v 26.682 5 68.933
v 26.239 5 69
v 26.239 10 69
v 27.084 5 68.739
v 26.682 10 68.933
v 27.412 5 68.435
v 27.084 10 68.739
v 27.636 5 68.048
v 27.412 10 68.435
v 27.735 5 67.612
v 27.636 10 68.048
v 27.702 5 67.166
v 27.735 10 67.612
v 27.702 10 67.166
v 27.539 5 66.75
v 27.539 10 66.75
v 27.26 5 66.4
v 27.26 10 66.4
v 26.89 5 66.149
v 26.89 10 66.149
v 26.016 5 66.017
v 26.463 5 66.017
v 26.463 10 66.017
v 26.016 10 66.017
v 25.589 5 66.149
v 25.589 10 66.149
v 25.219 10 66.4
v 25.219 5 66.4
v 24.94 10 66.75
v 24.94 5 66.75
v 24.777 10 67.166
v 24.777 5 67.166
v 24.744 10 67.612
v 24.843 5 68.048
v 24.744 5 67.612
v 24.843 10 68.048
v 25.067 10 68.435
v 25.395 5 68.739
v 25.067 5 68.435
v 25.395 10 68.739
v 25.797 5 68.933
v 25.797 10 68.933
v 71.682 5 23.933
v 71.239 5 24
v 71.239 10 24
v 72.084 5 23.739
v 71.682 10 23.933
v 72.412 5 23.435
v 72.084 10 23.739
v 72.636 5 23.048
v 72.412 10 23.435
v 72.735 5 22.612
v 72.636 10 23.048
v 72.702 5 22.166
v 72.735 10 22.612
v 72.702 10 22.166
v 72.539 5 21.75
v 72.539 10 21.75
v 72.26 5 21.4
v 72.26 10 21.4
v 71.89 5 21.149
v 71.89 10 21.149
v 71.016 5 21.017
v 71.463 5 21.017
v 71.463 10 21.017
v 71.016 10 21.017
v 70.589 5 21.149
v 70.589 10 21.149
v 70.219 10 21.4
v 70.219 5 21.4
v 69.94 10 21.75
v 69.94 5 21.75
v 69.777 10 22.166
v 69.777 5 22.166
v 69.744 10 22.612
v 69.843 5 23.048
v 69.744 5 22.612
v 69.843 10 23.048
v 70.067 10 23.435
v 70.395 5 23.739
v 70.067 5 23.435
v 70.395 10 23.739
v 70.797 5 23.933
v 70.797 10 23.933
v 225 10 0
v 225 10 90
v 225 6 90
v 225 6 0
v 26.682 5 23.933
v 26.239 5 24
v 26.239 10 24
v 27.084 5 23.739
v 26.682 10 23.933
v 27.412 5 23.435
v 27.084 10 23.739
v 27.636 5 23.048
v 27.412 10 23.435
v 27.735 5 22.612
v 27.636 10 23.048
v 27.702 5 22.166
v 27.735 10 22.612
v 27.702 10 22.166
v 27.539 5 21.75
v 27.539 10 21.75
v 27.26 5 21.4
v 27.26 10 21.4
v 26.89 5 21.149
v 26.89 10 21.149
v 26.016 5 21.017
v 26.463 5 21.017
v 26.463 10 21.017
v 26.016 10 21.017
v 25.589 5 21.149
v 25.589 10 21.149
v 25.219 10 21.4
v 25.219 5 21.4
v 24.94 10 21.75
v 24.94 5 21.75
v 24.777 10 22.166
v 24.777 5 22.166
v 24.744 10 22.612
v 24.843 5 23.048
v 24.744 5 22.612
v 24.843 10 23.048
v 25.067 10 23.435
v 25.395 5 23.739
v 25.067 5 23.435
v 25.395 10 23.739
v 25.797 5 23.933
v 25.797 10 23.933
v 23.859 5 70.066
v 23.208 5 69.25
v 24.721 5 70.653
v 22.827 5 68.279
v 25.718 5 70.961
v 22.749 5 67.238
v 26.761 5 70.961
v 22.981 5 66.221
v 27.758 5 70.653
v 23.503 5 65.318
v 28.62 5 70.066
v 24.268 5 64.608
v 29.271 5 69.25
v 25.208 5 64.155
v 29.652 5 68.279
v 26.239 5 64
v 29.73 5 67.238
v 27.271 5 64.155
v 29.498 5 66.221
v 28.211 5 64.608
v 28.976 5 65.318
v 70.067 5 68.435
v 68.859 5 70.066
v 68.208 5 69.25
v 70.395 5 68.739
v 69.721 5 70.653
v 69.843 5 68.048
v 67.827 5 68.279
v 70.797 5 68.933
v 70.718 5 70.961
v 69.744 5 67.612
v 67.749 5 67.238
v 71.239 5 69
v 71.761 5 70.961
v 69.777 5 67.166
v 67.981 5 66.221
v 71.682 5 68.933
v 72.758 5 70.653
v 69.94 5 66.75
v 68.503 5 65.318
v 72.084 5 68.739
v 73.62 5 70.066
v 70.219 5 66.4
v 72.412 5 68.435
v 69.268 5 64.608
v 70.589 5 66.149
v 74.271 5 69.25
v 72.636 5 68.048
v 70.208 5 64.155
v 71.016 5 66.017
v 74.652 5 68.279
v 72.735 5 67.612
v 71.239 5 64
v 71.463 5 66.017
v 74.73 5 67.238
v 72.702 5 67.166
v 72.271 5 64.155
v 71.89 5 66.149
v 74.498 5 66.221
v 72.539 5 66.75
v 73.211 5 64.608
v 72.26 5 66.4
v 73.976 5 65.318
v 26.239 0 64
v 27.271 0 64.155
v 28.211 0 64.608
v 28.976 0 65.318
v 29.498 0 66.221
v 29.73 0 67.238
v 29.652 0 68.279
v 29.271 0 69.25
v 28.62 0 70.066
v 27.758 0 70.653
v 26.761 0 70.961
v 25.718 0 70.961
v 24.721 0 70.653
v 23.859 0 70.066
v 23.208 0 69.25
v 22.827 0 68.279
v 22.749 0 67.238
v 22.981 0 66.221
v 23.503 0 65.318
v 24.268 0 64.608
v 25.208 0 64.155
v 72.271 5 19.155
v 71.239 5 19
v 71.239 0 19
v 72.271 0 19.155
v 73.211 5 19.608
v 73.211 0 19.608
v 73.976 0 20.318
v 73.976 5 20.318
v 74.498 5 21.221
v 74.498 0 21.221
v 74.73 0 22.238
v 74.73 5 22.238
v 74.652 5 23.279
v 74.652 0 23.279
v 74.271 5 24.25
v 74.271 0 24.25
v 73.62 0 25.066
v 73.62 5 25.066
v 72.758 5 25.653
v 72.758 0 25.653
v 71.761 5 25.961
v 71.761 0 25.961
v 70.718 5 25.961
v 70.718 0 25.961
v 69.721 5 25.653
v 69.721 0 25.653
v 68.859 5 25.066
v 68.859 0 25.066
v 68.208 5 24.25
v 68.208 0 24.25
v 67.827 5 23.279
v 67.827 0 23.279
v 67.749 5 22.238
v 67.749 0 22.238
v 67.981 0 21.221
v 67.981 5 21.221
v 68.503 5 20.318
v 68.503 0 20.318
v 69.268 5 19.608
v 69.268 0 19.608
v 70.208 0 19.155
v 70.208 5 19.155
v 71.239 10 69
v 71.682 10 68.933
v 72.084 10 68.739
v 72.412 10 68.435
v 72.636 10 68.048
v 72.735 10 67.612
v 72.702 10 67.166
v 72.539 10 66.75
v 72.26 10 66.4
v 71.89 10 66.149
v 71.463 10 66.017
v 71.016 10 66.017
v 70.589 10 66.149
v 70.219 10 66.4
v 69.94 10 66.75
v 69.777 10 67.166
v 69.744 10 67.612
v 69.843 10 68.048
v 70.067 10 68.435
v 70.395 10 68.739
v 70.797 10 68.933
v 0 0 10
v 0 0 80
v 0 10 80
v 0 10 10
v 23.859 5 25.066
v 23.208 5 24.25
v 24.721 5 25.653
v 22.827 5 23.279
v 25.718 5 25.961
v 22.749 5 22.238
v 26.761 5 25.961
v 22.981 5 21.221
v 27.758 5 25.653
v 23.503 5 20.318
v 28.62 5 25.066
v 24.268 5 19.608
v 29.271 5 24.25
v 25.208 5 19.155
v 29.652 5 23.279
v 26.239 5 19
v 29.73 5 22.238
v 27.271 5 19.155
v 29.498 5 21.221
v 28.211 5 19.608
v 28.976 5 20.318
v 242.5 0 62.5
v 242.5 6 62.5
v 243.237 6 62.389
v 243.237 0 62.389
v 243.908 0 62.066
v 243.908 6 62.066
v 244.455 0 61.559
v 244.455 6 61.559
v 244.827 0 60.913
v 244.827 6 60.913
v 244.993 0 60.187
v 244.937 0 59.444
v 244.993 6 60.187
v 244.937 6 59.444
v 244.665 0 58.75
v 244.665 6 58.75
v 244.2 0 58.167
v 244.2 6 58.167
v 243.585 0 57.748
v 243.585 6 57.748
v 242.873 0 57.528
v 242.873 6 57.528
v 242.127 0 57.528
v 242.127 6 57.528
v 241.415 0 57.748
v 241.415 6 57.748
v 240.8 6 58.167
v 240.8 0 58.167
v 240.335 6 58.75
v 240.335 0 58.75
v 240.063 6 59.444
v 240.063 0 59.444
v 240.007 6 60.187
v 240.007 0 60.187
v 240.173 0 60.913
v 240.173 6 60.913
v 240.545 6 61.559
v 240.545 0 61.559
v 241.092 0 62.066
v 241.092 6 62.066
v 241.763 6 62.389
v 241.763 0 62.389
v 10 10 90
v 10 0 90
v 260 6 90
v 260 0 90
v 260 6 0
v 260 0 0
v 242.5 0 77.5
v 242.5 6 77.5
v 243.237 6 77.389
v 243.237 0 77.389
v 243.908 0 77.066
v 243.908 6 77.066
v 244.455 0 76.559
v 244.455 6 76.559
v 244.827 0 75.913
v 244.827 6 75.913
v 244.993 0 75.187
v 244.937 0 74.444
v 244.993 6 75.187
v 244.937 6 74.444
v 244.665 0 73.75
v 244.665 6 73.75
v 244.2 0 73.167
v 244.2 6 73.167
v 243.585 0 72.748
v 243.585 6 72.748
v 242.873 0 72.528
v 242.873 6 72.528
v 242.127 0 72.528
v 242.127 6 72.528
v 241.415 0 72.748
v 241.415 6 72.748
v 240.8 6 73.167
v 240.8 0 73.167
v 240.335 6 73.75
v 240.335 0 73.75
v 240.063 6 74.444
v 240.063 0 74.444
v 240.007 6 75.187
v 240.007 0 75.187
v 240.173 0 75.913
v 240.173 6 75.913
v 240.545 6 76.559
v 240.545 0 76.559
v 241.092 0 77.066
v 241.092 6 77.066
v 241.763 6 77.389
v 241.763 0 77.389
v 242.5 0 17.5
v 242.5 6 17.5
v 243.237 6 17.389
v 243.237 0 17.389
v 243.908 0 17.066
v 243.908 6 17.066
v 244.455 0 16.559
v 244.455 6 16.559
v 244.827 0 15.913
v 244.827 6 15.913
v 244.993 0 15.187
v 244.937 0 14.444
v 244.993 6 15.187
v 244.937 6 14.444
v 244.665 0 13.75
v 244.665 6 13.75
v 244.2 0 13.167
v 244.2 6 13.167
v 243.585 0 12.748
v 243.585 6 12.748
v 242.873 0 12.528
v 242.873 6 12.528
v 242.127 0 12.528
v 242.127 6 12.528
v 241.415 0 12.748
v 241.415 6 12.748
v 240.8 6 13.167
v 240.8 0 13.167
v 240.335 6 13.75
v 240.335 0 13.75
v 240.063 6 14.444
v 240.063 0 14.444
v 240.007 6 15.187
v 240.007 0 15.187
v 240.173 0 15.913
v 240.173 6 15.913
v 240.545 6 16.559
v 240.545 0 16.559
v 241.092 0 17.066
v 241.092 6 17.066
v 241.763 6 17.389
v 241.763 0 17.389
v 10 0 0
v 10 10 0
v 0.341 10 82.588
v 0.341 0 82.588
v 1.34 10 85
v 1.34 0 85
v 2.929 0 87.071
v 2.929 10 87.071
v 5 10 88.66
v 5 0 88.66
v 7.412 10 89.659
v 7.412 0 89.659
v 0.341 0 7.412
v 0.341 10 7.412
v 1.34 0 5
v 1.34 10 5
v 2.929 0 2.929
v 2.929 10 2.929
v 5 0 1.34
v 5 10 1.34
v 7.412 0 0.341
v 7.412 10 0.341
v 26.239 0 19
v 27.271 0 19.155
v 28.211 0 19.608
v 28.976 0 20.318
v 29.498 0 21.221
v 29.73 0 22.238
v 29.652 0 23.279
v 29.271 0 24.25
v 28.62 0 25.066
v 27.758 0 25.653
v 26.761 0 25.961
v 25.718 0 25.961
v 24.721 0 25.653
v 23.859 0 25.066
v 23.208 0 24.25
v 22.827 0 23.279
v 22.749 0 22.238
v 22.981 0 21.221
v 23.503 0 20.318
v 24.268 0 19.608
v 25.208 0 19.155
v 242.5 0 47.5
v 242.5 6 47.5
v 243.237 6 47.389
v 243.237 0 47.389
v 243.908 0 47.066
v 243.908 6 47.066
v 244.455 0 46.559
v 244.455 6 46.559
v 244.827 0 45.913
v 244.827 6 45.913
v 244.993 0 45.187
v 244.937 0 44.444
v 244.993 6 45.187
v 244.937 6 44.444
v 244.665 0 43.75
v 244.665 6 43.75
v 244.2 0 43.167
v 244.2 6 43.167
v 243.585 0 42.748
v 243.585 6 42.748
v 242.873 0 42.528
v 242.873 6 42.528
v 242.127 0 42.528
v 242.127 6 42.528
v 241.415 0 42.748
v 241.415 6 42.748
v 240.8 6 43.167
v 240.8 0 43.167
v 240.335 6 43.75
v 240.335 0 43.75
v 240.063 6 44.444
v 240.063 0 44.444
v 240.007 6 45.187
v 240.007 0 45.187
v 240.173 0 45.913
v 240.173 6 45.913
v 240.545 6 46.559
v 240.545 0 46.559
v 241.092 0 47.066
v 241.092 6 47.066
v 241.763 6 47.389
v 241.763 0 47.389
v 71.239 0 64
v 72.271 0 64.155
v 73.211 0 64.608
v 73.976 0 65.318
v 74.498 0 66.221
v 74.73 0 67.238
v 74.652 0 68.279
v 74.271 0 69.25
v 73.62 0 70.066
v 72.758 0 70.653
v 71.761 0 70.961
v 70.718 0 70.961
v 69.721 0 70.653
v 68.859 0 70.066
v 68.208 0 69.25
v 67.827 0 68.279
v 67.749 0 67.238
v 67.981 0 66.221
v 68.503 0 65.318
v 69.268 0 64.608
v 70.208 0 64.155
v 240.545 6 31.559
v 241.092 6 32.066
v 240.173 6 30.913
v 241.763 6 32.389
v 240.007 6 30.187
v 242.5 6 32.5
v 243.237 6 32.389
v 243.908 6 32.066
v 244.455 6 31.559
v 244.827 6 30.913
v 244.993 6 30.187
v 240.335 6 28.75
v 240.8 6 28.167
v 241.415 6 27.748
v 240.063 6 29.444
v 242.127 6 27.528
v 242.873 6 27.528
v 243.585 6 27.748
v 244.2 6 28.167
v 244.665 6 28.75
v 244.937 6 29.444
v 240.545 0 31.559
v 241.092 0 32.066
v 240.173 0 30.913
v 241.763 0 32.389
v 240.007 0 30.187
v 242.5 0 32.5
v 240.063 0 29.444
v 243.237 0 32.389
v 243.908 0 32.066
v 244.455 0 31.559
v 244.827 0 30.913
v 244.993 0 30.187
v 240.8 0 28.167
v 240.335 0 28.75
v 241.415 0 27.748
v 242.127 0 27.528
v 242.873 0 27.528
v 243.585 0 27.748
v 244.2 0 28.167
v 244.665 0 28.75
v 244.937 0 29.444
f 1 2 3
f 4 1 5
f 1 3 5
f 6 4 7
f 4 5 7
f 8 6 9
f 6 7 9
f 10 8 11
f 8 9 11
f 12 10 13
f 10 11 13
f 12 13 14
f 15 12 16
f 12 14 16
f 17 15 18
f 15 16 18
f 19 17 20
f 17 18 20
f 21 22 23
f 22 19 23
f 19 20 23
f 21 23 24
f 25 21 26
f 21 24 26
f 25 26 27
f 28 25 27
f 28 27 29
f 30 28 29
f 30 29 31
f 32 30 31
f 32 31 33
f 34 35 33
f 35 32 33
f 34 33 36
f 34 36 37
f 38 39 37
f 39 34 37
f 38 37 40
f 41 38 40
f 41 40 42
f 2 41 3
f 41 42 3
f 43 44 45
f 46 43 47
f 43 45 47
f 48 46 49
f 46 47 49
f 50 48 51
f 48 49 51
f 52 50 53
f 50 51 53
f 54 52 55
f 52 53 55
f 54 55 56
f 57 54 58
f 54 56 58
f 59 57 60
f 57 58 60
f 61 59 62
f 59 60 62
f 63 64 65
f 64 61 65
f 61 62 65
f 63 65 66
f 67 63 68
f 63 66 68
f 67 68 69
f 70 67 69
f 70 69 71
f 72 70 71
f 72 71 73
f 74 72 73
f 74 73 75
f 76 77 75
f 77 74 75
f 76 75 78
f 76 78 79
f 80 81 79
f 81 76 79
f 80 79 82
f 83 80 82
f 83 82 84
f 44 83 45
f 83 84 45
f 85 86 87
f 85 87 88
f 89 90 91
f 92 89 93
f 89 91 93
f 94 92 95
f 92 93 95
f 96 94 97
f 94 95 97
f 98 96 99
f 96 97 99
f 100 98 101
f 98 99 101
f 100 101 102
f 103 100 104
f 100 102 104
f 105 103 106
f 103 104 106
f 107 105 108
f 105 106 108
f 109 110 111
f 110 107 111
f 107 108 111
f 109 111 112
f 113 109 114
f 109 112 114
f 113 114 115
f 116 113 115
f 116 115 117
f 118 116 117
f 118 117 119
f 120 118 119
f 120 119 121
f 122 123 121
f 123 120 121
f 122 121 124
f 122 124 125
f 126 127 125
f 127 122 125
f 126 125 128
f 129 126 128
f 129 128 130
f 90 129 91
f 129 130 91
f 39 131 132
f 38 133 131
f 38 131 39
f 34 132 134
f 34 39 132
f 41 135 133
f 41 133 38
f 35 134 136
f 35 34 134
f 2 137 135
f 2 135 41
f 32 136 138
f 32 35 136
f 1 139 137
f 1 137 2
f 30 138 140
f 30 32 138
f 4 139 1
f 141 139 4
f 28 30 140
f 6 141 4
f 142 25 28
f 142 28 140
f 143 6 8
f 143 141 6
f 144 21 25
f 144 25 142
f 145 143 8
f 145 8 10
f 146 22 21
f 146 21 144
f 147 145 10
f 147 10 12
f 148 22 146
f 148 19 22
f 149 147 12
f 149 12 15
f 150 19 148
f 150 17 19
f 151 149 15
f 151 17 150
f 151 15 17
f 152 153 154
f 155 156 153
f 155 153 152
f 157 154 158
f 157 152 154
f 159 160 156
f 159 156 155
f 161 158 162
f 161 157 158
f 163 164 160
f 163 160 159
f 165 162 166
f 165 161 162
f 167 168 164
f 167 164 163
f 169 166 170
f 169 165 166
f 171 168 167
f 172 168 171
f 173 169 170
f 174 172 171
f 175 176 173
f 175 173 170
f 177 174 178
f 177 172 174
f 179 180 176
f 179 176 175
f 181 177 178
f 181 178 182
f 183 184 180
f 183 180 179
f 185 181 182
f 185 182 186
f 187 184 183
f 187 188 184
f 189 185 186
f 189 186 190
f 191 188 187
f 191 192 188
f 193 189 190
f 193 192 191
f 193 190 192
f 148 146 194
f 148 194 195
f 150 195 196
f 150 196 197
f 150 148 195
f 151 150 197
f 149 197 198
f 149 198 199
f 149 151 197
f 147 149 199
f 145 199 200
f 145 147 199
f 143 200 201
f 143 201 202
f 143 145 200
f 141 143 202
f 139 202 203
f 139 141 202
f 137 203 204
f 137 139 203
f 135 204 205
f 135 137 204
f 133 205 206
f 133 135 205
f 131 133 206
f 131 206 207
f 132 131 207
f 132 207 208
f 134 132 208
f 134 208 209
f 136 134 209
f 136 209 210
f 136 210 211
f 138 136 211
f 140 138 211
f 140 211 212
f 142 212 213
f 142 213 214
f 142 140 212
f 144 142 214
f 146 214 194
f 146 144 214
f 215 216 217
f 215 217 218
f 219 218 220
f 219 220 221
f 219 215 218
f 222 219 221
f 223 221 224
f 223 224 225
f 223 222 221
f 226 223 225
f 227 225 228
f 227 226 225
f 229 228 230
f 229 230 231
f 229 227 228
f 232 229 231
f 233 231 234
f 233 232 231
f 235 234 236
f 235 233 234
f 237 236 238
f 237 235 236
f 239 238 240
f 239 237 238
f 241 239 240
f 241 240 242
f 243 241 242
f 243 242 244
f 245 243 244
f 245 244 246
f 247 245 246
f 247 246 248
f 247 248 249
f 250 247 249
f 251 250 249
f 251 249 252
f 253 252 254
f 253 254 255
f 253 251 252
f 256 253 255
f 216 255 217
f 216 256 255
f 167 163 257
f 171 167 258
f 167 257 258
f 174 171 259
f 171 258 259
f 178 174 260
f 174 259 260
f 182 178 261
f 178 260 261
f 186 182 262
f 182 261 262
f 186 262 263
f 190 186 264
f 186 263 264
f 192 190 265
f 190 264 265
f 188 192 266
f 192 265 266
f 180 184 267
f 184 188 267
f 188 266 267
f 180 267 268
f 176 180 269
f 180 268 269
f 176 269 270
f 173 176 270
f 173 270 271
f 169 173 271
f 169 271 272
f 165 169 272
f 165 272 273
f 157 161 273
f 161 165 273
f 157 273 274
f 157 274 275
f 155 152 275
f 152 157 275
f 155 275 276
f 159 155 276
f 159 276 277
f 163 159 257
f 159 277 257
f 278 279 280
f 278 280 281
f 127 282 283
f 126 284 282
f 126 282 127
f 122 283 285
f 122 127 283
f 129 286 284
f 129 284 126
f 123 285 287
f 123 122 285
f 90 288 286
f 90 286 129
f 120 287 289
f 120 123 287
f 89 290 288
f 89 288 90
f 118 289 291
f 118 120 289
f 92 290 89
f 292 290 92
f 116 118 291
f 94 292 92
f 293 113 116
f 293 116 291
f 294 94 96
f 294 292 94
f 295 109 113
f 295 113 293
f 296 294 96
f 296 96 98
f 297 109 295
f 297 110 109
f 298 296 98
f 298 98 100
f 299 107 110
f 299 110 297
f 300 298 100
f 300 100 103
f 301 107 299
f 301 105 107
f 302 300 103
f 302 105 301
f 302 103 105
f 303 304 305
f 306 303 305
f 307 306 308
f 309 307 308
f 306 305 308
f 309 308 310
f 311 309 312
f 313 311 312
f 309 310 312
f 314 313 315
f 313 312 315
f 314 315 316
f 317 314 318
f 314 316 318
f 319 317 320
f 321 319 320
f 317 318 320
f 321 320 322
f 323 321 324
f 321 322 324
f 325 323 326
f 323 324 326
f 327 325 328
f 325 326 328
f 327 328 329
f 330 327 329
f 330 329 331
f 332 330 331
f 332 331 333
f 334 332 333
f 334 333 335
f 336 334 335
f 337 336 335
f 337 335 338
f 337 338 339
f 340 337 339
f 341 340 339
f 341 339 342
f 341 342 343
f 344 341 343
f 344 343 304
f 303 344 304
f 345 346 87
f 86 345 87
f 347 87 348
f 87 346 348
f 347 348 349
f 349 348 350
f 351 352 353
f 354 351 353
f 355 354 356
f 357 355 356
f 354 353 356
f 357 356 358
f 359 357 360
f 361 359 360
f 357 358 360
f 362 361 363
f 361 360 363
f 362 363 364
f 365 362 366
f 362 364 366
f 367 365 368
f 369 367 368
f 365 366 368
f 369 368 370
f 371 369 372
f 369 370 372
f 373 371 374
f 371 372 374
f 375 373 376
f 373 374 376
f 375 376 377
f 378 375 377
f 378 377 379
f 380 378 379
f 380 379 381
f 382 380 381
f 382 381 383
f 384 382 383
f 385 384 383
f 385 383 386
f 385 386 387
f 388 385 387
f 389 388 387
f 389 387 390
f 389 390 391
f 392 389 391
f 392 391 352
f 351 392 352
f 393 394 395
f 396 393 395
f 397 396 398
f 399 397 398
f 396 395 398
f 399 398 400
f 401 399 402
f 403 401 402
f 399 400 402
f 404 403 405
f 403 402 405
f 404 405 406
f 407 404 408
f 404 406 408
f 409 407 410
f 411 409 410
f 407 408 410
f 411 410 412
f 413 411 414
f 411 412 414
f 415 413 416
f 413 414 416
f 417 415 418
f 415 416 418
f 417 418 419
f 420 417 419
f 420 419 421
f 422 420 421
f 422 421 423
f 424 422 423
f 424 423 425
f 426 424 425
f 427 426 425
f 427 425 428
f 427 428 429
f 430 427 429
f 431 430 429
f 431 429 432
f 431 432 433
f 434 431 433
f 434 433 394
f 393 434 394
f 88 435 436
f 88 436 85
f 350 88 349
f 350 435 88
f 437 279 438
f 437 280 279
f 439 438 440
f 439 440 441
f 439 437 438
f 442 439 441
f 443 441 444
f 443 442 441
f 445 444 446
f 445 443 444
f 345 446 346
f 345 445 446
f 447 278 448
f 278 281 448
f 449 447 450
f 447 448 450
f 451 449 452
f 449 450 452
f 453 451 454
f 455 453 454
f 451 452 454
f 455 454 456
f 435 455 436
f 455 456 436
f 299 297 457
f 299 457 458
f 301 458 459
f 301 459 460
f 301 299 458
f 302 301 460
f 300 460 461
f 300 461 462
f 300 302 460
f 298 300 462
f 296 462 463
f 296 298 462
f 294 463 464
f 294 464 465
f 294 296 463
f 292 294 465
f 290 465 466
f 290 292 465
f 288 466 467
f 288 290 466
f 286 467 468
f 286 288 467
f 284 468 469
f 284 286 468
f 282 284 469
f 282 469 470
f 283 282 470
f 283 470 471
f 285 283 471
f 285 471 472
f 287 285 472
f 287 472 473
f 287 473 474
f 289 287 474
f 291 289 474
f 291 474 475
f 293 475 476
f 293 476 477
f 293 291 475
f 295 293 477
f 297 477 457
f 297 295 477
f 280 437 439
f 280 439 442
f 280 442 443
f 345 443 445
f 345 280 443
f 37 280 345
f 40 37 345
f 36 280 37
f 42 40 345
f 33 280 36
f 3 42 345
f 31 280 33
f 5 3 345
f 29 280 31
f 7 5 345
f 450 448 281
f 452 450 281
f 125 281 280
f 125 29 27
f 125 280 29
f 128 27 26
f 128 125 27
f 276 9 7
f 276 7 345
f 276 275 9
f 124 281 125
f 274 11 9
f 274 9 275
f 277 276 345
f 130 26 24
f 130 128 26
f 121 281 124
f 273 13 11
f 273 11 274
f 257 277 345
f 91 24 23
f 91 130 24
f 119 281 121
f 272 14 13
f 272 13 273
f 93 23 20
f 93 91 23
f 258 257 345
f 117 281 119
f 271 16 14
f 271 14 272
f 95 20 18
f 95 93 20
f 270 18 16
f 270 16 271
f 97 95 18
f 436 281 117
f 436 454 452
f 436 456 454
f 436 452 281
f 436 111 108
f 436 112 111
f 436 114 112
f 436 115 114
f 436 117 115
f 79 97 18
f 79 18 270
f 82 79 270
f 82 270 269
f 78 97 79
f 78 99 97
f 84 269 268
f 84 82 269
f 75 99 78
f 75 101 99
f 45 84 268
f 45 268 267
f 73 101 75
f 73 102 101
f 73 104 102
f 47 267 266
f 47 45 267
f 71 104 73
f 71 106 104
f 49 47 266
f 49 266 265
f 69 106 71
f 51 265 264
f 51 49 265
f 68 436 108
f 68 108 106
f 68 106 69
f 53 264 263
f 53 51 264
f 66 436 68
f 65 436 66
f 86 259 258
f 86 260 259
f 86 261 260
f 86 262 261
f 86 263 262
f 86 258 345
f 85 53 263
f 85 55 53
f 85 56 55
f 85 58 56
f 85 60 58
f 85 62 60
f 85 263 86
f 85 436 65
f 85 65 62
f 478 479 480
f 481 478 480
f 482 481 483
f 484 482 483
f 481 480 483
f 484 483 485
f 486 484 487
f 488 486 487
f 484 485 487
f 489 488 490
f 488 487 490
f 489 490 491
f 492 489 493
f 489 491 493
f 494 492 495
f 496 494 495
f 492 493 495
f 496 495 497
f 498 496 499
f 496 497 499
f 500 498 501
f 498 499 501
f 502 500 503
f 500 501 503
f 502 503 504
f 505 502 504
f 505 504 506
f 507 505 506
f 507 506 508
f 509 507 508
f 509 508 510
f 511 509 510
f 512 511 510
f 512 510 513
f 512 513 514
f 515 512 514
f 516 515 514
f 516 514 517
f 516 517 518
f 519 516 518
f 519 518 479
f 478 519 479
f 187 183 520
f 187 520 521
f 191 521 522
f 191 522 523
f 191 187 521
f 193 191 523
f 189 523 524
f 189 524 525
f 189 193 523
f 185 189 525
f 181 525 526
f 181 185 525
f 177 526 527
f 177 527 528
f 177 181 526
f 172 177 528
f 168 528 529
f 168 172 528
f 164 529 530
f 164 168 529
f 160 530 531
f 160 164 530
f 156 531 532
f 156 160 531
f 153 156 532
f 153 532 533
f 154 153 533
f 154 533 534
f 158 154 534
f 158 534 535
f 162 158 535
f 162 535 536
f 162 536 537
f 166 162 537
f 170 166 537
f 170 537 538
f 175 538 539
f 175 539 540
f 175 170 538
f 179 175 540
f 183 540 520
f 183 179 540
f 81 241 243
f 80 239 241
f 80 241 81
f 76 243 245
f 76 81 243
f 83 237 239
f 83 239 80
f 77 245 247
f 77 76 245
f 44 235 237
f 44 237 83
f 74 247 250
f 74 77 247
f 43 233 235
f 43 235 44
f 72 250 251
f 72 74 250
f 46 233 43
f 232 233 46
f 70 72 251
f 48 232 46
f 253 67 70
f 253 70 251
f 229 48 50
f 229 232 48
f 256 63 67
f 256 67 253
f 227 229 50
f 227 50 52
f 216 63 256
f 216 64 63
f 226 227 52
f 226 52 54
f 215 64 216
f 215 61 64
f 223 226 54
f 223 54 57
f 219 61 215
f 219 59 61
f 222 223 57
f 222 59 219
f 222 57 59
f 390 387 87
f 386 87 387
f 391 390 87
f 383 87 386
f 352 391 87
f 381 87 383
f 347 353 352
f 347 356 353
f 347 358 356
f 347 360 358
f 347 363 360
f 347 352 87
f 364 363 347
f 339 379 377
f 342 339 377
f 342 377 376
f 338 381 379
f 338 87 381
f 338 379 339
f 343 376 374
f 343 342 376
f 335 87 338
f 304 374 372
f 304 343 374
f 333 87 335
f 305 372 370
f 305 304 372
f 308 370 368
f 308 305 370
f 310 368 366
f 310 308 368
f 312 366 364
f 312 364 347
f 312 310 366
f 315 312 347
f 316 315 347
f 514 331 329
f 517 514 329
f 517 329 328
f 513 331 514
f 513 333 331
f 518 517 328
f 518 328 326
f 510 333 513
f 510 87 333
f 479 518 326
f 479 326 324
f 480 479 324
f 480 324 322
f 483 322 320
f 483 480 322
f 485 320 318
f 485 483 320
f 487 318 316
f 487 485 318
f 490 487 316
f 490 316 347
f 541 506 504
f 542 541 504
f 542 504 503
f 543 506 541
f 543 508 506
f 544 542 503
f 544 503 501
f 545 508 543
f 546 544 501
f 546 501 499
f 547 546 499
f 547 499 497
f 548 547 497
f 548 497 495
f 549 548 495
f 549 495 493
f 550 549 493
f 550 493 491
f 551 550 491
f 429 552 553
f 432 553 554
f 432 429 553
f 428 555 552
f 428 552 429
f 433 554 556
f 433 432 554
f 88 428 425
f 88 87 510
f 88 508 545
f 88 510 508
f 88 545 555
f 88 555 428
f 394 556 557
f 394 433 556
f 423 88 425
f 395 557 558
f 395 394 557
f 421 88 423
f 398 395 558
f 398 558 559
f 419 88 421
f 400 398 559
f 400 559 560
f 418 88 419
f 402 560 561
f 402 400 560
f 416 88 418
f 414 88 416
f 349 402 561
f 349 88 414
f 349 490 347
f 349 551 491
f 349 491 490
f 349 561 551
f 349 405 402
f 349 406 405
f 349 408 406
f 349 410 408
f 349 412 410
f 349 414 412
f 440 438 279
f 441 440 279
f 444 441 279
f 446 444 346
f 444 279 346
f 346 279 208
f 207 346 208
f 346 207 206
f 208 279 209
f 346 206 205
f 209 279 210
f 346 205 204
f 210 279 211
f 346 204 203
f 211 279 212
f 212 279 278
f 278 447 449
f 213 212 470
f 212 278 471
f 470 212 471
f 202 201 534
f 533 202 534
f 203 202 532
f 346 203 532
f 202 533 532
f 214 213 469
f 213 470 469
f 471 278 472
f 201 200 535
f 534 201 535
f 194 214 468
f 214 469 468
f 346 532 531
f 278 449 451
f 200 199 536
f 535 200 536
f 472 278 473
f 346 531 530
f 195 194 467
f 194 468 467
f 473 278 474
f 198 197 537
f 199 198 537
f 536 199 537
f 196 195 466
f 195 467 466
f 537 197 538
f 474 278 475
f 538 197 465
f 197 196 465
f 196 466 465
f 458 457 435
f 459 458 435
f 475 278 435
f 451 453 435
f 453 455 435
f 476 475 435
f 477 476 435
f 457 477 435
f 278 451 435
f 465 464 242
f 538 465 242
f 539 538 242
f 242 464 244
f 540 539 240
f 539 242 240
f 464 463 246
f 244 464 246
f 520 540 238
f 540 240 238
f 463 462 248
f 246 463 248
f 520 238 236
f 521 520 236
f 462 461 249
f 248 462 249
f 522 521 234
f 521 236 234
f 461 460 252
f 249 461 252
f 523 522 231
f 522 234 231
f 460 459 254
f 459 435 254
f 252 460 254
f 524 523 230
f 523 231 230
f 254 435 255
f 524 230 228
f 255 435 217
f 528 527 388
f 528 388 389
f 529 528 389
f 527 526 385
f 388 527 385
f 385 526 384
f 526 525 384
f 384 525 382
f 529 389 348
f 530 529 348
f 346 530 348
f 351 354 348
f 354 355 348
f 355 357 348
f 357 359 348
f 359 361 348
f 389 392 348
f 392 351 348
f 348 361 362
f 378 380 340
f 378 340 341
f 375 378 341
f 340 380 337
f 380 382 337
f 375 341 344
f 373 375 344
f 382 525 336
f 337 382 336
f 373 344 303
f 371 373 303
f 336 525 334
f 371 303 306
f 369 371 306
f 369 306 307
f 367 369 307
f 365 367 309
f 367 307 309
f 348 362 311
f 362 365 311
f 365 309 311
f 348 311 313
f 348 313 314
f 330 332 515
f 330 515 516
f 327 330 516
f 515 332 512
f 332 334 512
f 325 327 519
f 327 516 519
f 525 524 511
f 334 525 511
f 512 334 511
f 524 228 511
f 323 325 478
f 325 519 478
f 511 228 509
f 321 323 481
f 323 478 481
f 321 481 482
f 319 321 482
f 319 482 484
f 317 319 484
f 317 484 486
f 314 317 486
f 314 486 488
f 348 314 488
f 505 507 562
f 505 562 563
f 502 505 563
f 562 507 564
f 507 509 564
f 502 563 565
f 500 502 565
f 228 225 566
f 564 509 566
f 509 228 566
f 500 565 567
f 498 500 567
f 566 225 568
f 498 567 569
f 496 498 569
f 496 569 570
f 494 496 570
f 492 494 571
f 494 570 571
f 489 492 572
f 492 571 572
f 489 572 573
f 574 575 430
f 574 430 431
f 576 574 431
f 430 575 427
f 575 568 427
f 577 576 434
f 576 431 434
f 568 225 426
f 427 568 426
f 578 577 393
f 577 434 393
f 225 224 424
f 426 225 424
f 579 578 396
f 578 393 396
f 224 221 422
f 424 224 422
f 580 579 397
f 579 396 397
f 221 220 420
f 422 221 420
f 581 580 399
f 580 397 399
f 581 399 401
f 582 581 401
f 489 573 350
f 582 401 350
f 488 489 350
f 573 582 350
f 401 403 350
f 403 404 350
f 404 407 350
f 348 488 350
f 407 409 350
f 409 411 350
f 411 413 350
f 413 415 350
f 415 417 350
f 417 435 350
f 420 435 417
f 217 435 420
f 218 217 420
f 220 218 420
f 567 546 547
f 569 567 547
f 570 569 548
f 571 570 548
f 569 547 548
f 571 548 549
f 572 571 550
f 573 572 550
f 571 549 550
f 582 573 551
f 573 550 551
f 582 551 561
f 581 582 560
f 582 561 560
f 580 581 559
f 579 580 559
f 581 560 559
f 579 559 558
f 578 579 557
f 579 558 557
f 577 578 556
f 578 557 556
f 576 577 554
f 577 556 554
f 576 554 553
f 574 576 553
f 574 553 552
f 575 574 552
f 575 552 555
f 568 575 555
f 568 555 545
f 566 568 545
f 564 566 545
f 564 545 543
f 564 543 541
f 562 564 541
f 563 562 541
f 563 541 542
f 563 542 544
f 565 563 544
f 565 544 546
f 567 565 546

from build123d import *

# Parameters (mm, degrees)
SKETCH_1_W          = 260
SKETCH_1_H          = 90
EXTRUDE_1_DEPTH     = 10
SKETCH_2_W          = 35
SKETCH_2_H          = 90
CUT_EXTRUDE_1_DEPTH = 4
SKETCH_3_R          = 1.5
CUT_EXTRUDE_2_DEPTH = 10
CUT_EXTRUDE_START   = -5
SKETCH_4_R          = 3.5
SKETCH_4_R_2        = 1.5
CUT_EXTRUDE_3_DEPTH = 5
SKETCH_5_R          = 2.5
CUT_EXTRUDE_4_DEPTH = 25
FILLET_1_R          = 10


with BuildPart() as part:
    # 草图1 → 凸台-拉伸1 (new body)
    with BuildSketch(Plane(origin=(0, 0, 0), x_dir=(1, 0, 0), z_dir=(0, 1, 0))):
        with Locations((130, -45)):
            Rectangle(SKETCH_1_W, SKETCH_1_H)
    extrude(amount=EXTRUDE_1_DEPTH)

    # 草图2 → 切除-拉伸1 (cut)
    with BuildSketch(Plane(origin=(0, 10, 0), x_dir=(1, 0, 0), z_dir=(0, 1, 0))):
        with Locations((242.5, -45)):
            Rectangle(SKETCH_2_W, SKETCH_2_H)
    extrude(amount=-CUT_EXTRUDE_1_DEPTH, mode=Mode.SUBTRACT)

    # 草图3 → 切除-拉伸2 (cut)
    with BuildSketch(Plane(origin=(0, 10, 0), x_dir=(1, 0, 0), z_dir=(0, 1, 0))):
        with Locations(Location((26.239488698, -22.5, 0), (0, 0, 270))):
            Circle(SKETCH_3_R)
        with Locations(Location((26.239488698, -67.5, 0), (0, 0, 270))):
            Circle(SKETCH_3_R)
        with Locations(Location((71.239488698, -67.5, 0), (0, 0, 270))):
            Circle(SKETCH_3_R)
        with Locations(Location((71.239488698, -22.5, 0), (0, 0, 270))):
            Circle(SKETCH_3_R)
    extrude(amount=-CUT_EXTRUDE_2_DEPTH, mode=Mode.SUBTRACT)

    # 草图4 → 切除-拉伸3 (cut)
    # profile 1 of 4: a face of its own
    with BuildSketch(Plane.XZ.offset(CUT_EXTRUDE_START)):
        with Locations(Location((26.239488698, 67.5, 0), (0, 0, 270))):
            Circle(SKETCH_4_R)
        with Locations(Location((26.239488698, 67.5, 0), (0, 0, 90))):
            Circle(SKETCH_4_R_2, mode=Mode.SUBTRACT)
    # profile 2 of 4: a face of its own
    with BuildSketch(Plane.XZ.offset(CUT_EXTRUDE_START)):
        with Locations(Location((26.239488698, 22.5, 0), (0, 0, 270))):
            Circle(SKETCH_4_R)
        with Locations(Location((26.239488698, 22.5, 0), (0, 0, 90))):
            Circle(SKETCH_4_R_2, mode=Mode.SUBTRACT)
    # profile 3 of 4: a face of its own
    with BuildSketch(Plane.XZ.offset(CUT_EXTRUDE_START)):
        with Locations(Location((71.239488698, 22.5, 0), (0, 0, 270))):
            Circle(SKETCH_4_R)
        with Locations(Location((71.239488698, 22.5, 0), (0, 0, 90))):
            Circle(SKETCH_4_R_2, mode=Mode.SUBTRACT)
    # profile 4 of 4: a face of its own
    with BuildSketch(Plane.XZ.offset(CUT_EXTRUDE_START)):
        with Locations(Location((71.239488698, 67.5, 0), (0, 0, 270))):
            Circle(SKETCH_4_R)
        with Locations(Location((71.239488698, 67.5, 0), (0, 0, 90))):
            Circle(SKETCH_4_R_2, mode=Mode.SUBTRACT)
    extrude(amount=CUT_EXTRUDE_3_DEPTH, mode=Mode.SUBTRACT)

    # 草图5 → 切除-拉伸4 (cut)
    with BuildSketch(Plane(origin=(0, 6, 0), x_dir=(1, 0, 0), z_dir=(0, 1, 0))):
        with Locations(Location((242.5, -45, 0), (0, 0, 270))):
            Circle(SKETCH_5_R)
        with Locations(Location((242.5, -15, 0), (0, 0, 270))):
            Circle(SKETCH_5_R)
        with Locations(Location((242.5, -75, 0), (0, 0, 270))):
            Circle(SKETCH_5_R)
        with Locations(Location((242.5, -30, 0), (0, 0, 270))):
            Circle(SKETCH_5_R)
        with Locations(Location((242.5, -60, 0), (0, 0, 270))):
            Circle(SKETCH_5_R)
    extrude(amount=-CUT_EXTRUDE_4_DEPTH, mode=Mode.SUBTRACT)

    # 圆角1
    fillet_1_edges = [part.edges().sort_by_distance(p)[0] for p in [
        (0, 5, 0),
        (0, 5, 90),
    ]]
    fillet(fillet_1_edges, radius=FILLET_1_R)


solid = part.part
